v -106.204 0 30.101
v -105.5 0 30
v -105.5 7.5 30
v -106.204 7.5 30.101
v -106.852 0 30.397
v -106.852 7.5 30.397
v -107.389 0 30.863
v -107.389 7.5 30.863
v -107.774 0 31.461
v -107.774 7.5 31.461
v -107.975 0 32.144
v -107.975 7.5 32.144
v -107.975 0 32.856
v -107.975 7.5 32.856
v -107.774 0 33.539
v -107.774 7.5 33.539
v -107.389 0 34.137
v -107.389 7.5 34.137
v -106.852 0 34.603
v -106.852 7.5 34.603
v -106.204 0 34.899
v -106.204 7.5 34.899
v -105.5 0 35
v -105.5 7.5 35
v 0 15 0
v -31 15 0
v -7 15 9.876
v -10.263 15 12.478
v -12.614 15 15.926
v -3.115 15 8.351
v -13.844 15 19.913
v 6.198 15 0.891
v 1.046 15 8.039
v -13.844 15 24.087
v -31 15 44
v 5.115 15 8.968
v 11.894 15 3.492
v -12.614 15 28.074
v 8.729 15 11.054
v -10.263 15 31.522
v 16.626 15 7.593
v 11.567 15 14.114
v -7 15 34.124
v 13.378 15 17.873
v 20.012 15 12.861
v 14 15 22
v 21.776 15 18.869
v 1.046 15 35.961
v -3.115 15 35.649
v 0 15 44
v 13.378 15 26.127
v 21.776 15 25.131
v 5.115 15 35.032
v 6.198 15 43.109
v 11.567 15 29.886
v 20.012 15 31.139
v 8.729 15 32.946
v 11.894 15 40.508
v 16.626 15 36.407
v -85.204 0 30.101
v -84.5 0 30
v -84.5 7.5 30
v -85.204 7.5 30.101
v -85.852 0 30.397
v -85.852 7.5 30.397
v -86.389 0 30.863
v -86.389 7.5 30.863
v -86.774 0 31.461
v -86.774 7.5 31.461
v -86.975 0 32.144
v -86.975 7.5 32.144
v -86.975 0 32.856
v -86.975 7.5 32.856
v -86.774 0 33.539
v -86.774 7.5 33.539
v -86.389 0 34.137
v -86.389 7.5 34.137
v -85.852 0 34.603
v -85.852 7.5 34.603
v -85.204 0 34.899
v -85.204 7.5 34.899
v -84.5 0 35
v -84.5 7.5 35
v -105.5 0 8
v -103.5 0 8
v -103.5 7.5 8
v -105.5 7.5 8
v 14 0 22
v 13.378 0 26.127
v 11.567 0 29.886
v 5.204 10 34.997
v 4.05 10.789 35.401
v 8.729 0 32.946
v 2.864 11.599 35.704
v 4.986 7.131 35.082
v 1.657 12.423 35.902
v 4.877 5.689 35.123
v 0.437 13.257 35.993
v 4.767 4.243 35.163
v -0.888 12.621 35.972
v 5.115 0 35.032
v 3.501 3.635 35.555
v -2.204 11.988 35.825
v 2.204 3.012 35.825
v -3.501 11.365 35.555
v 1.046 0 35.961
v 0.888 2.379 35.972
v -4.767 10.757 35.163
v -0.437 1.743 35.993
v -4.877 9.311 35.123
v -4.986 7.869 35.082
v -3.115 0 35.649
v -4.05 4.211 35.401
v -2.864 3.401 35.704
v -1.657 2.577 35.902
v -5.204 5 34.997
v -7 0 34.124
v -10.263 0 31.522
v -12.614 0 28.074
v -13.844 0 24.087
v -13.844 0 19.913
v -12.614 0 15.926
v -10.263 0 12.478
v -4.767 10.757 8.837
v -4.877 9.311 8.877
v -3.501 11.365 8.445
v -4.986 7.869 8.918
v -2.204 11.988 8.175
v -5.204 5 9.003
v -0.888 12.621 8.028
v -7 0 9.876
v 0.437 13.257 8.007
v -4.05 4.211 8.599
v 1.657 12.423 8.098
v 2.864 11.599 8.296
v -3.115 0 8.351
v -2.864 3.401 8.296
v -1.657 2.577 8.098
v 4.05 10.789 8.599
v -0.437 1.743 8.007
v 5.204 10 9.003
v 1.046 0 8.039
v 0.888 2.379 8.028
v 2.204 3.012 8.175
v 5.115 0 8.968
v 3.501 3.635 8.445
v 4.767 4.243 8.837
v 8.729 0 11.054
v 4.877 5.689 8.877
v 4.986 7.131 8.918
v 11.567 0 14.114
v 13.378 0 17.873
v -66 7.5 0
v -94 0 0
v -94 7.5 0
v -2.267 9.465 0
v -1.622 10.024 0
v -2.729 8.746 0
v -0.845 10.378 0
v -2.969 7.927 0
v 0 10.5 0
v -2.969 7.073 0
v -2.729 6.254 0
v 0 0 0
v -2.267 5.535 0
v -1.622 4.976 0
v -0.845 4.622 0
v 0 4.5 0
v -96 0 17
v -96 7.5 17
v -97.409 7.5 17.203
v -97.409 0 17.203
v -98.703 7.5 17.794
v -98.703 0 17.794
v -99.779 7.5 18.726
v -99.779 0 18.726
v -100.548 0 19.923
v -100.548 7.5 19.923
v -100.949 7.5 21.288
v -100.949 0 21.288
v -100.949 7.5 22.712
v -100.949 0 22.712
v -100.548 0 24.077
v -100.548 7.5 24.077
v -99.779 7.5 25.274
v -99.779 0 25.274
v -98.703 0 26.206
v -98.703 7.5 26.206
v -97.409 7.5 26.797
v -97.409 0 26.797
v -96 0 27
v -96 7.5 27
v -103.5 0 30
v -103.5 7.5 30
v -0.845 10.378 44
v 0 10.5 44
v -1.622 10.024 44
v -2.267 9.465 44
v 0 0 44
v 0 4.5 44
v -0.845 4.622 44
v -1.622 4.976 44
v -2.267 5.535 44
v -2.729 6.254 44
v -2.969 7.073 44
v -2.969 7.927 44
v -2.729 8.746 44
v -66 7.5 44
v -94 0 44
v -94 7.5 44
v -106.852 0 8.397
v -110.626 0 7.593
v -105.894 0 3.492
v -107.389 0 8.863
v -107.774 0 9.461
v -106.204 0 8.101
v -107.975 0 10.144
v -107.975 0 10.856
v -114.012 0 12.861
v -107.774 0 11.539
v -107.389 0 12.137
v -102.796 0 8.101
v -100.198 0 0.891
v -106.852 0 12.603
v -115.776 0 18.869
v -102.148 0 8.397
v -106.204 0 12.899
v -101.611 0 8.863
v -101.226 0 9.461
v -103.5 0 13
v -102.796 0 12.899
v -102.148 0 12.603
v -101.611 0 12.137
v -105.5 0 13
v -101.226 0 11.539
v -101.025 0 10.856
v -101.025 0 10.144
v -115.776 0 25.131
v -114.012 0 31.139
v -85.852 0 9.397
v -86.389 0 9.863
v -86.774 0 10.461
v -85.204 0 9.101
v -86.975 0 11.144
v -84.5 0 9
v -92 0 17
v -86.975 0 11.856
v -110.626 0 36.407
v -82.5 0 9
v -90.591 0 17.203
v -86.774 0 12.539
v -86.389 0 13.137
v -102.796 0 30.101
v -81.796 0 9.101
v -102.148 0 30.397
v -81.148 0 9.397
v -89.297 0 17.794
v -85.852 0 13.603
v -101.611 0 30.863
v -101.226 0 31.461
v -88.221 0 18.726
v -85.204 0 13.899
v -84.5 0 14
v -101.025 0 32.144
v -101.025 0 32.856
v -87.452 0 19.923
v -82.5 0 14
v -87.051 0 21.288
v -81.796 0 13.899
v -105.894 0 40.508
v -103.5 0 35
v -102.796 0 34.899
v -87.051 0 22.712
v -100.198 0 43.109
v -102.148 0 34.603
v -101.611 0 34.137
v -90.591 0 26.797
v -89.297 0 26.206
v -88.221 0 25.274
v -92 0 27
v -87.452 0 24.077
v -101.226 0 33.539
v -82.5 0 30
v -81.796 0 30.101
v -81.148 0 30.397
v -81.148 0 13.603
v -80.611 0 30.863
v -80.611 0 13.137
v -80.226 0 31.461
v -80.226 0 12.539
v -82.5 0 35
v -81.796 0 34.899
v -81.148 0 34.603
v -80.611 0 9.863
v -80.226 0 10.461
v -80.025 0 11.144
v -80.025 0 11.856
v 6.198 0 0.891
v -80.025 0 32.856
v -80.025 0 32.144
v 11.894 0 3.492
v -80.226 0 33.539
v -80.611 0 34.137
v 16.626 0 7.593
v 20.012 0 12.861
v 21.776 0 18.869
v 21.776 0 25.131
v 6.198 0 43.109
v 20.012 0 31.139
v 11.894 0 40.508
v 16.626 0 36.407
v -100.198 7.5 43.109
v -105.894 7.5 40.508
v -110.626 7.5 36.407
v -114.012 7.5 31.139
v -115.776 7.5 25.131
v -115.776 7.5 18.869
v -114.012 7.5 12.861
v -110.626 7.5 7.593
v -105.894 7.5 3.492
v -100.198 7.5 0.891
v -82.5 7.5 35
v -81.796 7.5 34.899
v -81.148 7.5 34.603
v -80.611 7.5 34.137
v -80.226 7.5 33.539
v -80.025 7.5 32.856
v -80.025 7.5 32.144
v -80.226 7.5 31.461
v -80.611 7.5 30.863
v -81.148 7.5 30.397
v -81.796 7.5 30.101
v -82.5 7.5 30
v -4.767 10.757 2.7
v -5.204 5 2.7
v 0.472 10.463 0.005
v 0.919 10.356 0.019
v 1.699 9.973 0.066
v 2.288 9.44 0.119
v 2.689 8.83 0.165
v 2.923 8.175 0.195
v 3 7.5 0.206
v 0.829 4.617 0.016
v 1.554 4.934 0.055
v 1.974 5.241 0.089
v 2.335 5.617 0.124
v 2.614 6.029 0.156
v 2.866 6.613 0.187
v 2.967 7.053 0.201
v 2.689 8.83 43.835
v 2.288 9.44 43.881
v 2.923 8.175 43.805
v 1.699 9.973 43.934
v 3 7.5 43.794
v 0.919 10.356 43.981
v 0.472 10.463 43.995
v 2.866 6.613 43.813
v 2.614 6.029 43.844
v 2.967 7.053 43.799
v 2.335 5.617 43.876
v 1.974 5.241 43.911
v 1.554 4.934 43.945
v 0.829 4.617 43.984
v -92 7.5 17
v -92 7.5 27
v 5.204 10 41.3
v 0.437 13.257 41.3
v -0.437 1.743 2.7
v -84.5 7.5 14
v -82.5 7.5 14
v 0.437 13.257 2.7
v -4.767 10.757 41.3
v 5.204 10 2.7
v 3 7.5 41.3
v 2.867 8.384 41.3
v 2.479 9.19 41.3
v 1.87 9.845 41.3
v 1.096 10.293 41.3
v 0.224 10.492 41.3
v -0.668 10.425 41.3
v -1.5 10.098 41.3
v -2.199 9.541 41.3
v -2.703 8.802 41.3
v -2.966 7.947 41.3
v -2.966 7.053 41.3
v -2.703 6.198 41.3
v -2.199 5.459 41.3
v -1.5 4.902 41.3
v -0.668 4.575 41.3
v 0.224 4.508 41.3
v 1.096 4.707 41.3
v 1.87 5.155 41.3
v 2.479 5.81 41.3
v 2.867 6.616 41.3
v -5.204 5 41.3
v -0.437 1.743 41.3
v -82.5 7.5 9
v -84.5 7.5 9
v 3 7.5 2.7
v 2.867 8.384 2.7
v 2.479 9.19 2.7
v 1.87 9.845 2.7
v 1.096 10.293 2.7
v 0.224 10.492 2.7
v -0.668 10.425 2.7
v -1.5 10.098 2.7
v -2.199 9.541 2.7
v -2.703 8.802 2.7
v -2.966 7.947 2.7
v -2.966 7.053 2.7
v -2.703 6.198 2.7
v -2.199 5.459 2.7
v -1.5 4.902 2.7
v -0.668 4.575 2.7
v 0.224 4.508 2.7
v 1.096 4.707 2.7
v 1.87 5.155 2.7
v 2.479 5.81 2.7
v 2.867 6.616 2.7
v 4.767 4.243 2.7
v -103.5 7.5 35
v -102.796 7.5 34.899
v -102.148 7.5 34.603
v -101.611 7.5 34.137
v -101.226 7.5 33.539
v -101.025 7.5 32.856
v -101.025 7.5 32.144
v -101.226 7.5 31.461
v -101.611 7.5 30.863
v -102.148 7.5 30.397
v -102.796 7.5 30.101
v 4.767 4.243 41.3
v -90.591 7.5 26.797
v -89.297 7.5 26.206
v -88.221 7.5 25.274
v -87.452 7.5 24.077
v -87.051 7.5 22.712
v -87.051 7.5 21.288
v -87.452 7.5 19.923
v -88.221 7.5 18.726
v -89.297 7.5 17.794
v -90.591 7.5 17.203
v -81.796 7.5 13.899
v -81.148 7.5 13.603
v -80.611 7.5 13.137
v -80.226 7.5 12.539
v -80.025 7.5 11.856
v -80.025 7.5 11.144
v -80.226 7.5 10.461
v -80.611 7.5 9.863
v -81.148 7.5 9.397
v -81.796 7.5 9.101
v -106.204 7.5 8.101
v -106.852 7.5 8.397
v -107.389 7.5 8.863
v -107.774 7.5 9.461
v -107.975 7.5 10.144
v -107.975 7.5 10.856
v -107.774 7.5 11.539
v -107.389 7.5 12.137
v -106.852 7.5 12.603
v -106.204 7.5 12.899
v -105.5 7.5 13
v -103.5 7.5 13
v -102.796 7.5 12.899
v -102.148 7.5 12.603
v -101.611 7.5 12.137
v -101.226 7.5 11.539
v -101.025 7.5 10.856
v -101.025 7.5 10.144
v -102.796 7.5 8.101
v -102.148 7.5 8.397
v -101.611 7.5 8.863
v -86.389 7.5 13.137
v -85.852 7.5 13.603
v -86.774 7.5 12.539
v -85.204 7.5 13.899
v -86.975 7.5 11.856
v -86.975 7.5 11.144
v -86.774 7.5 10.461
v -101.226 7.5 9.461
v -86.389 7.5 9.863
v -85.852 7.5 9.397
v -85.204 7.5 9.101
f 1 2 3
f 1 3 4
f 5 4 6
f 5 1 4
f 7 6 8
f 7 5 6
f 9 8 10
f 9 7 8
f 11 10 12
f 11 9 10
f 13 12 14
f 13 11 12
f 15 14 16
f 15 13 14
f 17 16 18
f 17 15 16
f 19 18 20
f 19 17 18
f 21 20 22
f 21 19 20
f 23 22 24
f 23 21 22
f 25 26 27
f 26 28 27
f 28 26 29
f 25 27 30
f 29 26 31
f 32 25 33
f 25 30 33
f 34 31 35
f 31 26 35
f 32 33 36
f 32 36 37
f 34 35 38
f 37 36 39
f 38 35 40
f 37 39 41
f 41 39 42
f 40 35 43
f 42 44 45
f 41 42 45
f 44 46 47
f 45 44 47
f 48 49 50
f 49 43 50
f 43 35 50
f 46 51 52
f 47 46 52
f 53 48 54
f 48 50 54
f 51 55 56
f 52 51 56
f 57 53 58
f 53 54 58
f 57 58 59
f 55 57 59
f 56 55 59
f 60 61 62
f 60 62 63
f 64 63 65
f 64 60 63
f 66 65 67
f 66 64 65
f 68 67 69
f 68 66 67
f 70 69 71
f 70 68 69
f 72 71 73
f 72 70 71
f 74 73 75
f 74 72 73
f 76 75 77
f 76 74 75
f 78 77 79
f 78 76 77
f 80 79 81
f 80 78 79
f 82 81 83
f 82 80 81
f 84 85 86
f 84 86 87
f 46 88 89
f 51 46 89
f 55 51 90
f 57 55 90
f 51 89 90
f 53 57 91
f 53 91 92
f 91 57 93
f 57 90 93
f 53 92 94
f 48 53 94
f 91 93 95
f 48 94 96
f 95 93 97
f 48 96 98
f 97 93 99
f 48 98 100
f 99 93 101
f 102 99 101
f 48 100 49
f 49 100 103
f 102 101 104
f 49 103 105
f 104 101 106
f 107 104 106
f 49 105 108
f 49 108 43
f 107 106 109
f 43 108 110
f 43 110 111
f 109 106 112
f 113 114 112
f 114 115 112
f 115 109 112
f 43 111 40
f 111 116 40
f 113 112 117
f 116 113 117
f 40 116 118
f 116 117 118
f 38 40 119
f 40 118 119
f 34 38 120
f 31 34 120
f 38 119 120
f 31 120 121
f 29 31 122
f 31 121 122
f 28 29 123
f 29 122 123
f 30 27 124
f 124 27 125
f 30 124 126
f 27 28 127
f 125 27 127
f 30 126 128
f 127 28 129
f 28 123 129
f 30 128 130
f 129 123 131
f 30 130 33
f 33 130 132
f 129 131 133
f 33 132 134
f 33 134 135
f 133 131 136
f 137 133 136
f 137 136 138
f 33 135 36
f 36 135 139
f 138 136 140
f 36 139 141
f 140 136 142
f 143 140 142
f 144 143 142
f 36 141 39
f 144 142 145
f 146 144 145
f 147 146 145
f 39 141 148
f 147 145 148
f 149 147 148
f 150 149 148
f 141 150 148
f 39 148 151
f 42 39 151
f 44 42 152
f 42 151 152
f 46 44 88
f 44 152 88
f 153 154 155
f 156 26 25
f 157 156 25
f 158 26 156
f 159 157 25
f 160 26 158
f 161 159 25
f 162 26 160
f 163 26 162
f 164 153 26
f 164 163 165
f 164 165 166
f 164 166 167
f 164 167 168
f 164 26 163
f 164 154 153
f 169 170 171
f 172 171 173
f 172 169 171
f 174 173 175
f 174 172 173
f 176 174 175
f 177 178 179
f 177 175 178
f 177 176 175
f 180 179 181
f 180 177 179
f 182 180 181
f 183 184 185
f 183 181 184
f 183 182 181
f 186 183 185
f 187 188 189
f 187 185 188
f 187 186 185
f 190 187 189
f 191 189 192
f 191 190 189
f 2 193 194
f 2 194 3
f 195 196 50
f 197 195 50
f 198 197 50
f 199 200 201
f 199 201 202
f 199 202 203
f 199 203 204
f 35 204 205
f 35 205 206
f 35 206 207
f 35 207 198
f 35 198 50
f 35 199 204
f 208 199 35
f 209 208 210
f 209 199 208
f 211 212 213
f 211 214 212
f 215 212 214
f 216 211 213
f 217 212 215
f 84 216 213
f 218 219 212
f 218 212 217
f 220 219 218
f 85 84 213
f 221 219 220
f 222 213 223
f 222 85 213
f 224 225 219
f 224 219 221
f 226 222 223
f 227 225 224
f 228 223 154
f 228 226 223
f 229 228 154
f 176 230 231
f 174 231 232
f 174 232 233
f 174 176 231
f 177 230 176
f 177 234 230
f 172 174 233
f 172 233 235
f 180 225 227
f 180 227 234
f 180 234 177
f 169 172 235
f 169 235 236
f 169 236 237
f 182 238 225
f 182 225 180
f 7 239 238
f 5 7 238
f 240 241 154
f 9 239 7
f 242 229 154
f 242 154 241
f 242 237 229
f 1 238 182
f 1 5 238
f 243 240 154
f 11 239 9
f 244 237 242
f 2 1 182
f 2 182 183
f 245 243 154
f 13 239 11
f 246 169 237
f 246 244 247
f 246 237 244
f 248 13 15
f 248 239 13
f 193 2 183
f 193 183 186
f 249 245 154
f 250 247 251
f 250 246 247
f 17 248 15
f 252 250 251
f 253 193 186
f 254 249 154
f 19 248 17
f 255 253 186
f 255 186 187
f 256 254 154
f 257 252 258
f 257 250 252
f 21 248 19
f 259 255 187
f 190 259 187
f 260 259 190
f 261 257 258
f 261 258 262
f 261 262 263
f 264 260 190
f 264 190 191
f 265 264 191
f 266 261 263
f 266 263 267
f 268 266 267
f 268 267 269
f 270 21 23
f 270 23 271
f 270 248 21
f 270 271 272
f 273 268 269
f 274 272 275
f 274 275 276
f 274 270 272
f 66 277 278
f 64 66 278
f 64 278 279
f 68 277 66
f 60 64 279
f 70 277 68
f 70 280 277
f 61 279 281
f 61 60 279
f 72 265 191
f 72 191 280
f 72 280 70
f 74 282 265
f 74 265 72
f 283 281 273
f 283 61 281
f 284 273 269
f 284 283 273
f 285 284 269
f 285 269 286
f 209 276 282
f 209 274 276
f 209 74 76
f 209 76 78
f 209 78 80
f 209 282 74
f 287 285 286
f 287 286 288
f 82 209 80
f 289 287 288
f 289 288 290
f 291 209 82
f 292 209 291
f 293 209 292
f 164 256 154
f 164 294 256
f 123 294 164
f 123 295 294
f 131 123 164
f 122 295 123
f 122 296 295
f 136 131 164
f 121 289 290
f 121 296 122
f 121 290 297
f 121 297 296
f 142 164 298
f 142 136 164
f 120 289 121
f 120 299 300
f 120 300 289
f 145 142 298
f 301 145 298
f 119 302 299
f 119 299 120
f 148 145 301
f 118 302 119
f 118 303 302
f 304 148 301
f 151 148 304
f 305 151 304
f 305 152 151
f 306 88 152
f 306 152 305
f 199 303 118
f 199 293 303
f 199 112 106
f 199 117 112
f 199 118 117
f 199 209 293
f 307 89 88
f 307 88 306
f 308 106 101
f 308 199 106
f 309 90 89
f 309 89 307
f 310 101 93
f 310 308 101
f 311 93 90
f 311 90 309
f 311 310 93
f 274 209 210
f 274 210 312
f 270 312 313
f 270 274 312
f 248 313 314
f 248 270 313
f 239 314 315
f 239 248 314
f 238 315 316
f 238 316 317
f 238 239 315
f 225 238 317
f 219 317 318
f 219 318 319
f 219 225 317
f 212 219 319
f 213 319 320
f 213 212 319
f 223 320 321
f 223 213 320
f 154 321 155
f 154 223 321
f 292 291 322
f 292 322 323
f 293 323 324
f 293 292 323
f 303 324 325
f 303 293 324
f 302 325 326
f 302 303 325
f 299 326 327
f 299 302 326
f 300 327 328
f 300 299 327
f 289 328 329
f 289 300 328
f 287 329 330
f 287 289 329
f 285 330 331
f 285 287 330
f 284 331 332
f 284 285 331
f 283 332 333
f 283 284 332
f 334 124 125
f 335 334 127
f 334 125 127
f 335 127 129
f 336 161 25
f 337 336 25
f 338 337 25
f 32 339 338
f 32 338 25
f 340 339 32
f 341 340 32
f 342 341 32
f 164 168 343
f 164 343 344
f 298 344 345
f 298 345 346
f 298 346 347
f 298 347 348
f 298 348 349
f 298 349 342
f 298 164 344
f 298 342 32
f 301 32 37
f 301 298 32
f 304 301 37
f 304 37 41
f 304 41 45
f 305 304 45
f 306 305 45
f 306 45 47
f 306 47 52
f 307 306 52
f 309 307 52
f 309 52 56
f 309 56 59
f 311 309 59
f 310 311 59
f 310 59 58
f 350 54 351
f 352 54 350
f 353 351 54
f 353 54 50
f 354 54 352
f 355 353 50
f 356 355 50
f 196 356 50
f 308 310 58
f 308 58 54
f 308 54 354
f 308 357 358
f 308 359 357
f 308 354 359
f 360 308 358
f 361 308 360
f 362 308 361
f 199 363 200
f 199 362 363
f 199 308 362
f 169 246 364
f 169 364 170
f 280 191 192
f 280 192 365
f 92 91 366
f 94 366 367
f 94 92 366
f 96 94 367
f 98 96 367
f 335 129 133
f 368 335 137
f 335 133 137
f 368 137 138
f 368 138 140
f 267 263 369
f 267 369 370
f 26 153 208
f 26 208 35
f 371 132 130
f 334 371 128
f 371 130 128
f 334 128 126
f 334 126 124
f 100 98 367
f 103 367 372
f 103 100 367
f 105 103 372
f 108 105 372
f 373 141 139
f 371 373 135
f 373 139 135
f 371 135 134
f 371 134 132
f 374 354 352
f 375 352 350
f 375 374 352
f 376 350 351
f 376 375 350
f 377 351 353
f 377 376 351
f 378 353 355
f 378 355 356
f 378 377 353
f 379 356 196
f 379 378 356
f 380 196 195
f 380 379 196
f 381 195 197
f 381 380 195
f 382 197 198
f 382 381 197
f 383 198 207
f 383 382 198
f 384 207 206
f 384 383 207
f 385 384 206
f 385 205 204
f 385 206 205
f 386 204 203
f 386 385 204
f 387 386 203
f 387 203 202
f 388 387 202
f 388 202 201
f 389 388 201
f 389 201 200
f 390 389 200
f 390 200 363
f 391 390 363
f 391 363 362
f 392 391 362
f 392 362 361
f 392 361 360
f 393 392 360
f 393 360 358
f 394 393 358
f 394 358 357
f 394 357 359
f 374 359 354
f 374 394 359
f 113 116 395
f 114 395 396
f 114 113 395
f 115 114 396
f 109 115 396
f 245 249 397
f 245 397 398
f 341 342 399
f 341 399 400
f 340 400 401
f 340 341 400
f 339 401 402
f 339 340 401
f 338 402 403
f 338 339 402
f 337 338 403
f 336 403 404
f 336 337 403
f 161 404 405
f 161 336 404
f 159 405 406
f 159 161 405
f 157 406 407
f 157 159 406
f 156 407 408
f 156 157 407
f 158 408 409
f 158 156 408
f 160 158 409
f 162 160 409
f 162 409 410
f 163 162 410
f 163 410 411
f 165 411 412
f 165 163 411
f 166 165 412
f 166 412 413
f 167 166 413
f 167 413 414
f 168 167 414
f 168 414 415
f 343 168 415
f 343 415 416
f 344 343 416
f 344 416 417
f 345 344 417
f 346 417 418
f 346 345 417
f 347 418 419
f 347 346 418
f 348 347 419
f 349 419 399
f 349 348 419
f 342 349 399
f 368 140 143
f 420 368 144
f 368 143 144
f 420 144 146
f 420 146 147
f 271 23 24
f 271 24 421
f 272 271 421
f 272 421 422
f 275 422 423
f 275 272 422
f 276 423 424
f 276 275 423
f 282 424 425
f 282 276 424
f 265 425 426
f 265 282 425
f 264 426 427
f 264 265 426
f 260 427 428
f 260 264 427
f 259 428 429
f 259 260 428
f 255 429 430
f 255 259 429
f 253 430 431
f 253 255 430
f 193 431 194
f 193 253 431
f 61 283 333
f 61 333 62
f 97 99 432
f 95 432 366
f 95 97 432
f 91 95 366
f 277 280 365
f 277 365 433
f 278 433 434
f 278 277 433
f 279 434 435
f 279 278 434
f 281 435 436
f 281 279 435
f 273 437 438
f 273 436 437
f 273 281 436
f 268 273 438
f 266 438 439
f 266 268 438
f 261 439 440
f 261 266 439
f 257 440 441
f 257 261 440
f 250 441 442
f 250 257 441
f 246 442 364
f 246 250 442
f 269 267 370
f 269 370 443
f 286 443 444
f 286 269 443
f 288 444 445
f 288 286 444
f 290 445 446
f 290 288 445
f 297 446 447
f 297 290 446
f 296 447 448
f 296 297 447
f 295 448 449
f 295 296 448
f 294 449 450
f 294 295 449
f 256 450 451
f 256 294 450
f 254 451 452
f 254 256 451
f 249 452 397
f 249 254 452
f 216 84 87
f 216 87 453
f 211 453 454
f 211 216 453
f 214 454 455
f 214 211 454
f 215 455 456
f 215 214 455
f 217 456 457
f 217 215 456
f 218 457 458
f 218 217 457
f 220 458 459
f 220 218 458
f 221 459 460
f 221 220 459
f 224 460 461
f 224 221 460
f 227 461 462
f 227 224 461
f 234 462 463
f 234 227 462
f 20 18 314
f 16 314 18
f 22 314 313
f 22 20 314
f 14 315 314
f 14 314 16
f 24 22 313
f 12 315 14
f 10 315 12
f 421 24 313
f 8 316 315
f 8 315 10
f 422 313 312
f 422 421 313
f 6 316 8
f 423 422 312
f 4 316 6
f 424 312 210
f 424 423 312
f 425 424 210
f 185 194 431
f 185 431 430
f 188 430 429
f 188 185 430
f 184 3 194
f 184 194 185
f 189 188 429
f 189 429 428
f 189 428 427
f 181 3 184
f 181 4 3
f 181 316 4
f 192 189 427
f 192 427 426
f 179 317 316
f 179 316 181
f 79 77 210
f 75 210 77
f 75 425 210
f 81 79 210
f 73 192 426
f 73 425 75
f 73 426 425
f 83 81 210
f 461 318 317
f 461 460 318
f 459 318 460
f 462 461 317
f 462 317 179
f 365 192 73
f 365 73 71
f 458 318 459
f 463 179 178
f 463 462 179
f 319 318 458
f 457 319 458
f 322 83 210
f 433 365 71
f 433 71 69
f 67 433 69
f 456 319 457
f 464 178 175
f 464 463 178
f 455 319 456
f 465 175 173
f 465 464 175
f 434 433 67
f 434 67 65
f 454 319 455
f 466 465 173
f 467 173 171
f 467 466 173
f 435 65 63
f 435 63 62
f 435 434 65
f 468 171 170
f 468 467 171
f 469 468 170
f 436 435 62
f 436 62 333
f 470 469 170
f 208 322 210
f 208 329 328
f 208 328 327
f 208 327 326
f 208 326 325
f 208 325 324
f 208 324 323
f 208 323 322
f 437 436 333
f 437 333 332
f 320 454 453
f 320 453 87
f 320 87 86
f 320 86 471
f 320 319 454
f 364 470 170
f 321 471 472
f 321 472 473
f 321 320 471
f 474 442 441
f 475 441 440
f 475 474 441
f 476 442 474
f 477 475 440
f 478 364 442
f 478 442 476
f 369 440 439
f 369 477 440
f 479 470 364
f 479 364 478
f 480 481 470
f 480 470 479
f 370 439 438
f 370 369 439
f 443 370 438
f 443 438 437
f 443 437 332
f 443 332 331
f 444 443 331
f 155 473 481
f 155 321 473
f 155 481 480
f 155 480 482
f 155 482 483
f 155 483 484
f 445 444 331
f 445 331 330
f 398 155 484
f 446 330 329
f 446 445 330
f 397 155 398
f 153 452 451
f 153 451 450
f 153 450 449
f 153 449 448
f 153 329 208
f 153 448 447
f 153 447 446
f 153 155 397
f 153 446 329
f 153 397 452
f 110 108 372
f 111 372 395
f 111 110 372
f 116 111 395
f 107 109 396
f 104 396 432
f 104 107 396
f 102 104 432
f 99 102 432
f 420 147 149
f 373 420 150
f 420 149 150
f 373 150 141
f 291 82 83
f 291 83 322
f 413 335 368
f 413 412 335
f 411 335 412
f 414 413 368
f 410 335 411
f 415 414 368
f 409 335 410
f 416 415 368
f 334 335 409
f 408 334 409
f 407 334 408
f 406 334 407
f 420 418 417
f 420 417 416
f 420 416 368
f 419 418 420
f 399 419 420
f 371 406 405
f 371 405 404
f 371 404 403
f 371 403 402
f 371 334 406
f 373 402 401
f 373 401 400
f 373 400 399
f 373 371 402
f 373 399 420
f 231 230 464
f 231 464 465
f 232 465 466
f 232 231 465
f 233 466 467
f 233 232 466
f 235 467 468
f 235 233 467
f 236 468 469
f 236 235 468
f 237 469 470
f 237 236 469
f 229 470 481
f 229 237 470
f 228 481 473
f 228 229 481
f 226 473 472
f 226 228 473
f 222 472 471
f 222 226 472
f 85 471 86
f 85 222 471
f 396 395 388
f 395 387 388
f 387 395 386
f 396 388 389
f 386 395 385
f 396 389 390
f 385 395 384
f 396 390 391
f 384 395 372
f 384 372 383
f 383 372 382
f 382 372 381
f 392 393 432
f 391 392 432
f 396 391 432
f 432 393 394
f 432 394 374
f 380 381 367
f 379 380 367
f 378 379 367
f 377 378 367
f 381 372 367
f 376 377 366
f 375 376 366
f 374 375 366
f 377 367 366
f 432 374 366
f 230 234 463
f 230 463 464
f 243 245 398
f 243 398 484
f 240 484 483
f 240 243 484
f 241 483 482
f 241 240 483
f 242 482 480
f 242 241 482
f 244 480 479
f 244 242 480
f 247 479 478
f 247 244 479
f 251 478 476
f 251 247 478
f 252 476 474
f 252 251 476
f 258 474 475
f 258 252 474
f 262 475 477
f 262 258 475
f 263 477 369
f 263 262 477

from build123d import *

# Parameters (mm, degrees)
F0_R      = 14
F1_DEPTH  = 15
F2_R      = 3
F3_DEPTH  = 50
F6_DEPTH  = 19.3
F7_DEPTH  = 19.3
F9_DEPTH  = 25
F10_DEPTH = 25


with BuildPart() as f1:
    # F0 (on Front) → F1 (new body)
    with BuildSketch(Plane.XZ):
        with BuildLine():
            Line((0, 44), (-94, 44))
            ThreePointArc((-94, 44), (-116, 22), (-94, 0))
            Line((-94, 0), (0, 0))
            ThreePointArc((0, 0), (22, 22), (0, 44))
        make_face()
        with BuildLine():
            Line((-105.5, 13), (-103.5, 13))
            ThreePointArc((-103.5, 13), (-101, 10.5), (-103.5, 8))
            Line((-103.5, 8), (-105.5, 8))
            ThreePointArc((-105.5, 8), (-108, 10.5), (-105.5, 13))
        make_face(mode=Mode.SUBTRACT)
        with BuildLine():
            Line((-84.5, 14), (-82.5, 14))
            ThreePointArc((-82.5, 14), (-80, 11.5), (-82.5, 9))
            Line((-82.5, 9), (-84.5, 9))
            ThreePointArc((-84.5, 9), (-87, 11.5), (-84.5, 14))
        make_face(mode=Mode.SUBTRACT)
        with BuildLine():
            Line((-96, 27), (-92, 27))
            ThreePointArc((-92, 27), (-87, 22), (-92, 17))
            Line((-92, 17), (-96, 17))
            ThreePointArc((-96, 17), (-100.999999, 22), (-96, 27))
        make_face(mode=Mode.SUBTRACT)
        with BuildLine():
            Line((-105.5, 35), (-103.5, 35))
            ThreePointArc((-103.5, 35), (-101, 32.5), (-103.5, 30))
            Line((-103.5, 30), (-105.5, 30))
            ThreePointArc((-105.5, 30), (-108, 32.5), (-105.5, 35))
        make_face(mode=Mode.SUBTRACT)
        with BuildLine():
            Line((-84.5, 35), (-82.5, 35))
            ThreePointArc((-82.5, 35), (-80, 32.5), (-82.5, 30))
            Line((-82.5, 30), (-84.5, 30))
            ThreePointArc((-84.5, 30), (-87, 32.5), (-84.5, 35))
        make_face(mode=Mode.SUBTRACT)
        with Locations((0, 22)):
            Circle(F0_R, mode=Mode.SUBTRACT)
    extrude(amount=-F1_DEPTH)

    # F2 (on Top) → F3 (cut)
    with BuildSketch(Plane.XY):
        with Locations((0, 7.5)):
            Circle(F2_R)
    extrude(amount=F3_DEPTH, mode=Mode.SUBTRACT)

    # F5 (on offset) → F6 (cut)
    with BuildSketch(Plane.XY.offset(22)):
        Polygon((4.767146, 4.243061), (5.204165, 10), (0.437019, 13.256939), (-4.767146, 10.756939), (-5.204165, 5), (-0.437019, 1.743061), align=None)
    extrude(amount=F6_DEPTH, mode=Mode.SUBTRACT)

    # F5 (on offset) → F7 (cut)
    with BuildSketch(Plane.XY.offset(22)):
        Polygon((4.767146, 4.243061), (5.204165, 10), (0.437019, 13.256939), (-4.767146, 10.756939), (-5.204165, 5), (-0.437019, 1.743061), align=None)
    extrude(amount=-F7_DEPTH, mode=Mode.SUBTRACT)

    # F8 (on offset) → F9 (cut)
    with BuildSketch(Plane.XY.offset(22)):
        Polygon((-116, 15), (-116, 7.5), (-66, 7.5), (-31, 15), align=None)
    extrude(amount=-F9_DEPTH, mode=Mode.SUBTRACT)

    # F8 (on offset) → F10 (cut)
    with BuildSketch(Plane.XY.offset(22)):
        Polygon((-116, 15), (-116, 7.5), (-66, 7.5), (-31, 15), align=None)
    extrude(amount=F10_DEPTH, mode=Mode.SUBTRACT)


solid = f1.part
